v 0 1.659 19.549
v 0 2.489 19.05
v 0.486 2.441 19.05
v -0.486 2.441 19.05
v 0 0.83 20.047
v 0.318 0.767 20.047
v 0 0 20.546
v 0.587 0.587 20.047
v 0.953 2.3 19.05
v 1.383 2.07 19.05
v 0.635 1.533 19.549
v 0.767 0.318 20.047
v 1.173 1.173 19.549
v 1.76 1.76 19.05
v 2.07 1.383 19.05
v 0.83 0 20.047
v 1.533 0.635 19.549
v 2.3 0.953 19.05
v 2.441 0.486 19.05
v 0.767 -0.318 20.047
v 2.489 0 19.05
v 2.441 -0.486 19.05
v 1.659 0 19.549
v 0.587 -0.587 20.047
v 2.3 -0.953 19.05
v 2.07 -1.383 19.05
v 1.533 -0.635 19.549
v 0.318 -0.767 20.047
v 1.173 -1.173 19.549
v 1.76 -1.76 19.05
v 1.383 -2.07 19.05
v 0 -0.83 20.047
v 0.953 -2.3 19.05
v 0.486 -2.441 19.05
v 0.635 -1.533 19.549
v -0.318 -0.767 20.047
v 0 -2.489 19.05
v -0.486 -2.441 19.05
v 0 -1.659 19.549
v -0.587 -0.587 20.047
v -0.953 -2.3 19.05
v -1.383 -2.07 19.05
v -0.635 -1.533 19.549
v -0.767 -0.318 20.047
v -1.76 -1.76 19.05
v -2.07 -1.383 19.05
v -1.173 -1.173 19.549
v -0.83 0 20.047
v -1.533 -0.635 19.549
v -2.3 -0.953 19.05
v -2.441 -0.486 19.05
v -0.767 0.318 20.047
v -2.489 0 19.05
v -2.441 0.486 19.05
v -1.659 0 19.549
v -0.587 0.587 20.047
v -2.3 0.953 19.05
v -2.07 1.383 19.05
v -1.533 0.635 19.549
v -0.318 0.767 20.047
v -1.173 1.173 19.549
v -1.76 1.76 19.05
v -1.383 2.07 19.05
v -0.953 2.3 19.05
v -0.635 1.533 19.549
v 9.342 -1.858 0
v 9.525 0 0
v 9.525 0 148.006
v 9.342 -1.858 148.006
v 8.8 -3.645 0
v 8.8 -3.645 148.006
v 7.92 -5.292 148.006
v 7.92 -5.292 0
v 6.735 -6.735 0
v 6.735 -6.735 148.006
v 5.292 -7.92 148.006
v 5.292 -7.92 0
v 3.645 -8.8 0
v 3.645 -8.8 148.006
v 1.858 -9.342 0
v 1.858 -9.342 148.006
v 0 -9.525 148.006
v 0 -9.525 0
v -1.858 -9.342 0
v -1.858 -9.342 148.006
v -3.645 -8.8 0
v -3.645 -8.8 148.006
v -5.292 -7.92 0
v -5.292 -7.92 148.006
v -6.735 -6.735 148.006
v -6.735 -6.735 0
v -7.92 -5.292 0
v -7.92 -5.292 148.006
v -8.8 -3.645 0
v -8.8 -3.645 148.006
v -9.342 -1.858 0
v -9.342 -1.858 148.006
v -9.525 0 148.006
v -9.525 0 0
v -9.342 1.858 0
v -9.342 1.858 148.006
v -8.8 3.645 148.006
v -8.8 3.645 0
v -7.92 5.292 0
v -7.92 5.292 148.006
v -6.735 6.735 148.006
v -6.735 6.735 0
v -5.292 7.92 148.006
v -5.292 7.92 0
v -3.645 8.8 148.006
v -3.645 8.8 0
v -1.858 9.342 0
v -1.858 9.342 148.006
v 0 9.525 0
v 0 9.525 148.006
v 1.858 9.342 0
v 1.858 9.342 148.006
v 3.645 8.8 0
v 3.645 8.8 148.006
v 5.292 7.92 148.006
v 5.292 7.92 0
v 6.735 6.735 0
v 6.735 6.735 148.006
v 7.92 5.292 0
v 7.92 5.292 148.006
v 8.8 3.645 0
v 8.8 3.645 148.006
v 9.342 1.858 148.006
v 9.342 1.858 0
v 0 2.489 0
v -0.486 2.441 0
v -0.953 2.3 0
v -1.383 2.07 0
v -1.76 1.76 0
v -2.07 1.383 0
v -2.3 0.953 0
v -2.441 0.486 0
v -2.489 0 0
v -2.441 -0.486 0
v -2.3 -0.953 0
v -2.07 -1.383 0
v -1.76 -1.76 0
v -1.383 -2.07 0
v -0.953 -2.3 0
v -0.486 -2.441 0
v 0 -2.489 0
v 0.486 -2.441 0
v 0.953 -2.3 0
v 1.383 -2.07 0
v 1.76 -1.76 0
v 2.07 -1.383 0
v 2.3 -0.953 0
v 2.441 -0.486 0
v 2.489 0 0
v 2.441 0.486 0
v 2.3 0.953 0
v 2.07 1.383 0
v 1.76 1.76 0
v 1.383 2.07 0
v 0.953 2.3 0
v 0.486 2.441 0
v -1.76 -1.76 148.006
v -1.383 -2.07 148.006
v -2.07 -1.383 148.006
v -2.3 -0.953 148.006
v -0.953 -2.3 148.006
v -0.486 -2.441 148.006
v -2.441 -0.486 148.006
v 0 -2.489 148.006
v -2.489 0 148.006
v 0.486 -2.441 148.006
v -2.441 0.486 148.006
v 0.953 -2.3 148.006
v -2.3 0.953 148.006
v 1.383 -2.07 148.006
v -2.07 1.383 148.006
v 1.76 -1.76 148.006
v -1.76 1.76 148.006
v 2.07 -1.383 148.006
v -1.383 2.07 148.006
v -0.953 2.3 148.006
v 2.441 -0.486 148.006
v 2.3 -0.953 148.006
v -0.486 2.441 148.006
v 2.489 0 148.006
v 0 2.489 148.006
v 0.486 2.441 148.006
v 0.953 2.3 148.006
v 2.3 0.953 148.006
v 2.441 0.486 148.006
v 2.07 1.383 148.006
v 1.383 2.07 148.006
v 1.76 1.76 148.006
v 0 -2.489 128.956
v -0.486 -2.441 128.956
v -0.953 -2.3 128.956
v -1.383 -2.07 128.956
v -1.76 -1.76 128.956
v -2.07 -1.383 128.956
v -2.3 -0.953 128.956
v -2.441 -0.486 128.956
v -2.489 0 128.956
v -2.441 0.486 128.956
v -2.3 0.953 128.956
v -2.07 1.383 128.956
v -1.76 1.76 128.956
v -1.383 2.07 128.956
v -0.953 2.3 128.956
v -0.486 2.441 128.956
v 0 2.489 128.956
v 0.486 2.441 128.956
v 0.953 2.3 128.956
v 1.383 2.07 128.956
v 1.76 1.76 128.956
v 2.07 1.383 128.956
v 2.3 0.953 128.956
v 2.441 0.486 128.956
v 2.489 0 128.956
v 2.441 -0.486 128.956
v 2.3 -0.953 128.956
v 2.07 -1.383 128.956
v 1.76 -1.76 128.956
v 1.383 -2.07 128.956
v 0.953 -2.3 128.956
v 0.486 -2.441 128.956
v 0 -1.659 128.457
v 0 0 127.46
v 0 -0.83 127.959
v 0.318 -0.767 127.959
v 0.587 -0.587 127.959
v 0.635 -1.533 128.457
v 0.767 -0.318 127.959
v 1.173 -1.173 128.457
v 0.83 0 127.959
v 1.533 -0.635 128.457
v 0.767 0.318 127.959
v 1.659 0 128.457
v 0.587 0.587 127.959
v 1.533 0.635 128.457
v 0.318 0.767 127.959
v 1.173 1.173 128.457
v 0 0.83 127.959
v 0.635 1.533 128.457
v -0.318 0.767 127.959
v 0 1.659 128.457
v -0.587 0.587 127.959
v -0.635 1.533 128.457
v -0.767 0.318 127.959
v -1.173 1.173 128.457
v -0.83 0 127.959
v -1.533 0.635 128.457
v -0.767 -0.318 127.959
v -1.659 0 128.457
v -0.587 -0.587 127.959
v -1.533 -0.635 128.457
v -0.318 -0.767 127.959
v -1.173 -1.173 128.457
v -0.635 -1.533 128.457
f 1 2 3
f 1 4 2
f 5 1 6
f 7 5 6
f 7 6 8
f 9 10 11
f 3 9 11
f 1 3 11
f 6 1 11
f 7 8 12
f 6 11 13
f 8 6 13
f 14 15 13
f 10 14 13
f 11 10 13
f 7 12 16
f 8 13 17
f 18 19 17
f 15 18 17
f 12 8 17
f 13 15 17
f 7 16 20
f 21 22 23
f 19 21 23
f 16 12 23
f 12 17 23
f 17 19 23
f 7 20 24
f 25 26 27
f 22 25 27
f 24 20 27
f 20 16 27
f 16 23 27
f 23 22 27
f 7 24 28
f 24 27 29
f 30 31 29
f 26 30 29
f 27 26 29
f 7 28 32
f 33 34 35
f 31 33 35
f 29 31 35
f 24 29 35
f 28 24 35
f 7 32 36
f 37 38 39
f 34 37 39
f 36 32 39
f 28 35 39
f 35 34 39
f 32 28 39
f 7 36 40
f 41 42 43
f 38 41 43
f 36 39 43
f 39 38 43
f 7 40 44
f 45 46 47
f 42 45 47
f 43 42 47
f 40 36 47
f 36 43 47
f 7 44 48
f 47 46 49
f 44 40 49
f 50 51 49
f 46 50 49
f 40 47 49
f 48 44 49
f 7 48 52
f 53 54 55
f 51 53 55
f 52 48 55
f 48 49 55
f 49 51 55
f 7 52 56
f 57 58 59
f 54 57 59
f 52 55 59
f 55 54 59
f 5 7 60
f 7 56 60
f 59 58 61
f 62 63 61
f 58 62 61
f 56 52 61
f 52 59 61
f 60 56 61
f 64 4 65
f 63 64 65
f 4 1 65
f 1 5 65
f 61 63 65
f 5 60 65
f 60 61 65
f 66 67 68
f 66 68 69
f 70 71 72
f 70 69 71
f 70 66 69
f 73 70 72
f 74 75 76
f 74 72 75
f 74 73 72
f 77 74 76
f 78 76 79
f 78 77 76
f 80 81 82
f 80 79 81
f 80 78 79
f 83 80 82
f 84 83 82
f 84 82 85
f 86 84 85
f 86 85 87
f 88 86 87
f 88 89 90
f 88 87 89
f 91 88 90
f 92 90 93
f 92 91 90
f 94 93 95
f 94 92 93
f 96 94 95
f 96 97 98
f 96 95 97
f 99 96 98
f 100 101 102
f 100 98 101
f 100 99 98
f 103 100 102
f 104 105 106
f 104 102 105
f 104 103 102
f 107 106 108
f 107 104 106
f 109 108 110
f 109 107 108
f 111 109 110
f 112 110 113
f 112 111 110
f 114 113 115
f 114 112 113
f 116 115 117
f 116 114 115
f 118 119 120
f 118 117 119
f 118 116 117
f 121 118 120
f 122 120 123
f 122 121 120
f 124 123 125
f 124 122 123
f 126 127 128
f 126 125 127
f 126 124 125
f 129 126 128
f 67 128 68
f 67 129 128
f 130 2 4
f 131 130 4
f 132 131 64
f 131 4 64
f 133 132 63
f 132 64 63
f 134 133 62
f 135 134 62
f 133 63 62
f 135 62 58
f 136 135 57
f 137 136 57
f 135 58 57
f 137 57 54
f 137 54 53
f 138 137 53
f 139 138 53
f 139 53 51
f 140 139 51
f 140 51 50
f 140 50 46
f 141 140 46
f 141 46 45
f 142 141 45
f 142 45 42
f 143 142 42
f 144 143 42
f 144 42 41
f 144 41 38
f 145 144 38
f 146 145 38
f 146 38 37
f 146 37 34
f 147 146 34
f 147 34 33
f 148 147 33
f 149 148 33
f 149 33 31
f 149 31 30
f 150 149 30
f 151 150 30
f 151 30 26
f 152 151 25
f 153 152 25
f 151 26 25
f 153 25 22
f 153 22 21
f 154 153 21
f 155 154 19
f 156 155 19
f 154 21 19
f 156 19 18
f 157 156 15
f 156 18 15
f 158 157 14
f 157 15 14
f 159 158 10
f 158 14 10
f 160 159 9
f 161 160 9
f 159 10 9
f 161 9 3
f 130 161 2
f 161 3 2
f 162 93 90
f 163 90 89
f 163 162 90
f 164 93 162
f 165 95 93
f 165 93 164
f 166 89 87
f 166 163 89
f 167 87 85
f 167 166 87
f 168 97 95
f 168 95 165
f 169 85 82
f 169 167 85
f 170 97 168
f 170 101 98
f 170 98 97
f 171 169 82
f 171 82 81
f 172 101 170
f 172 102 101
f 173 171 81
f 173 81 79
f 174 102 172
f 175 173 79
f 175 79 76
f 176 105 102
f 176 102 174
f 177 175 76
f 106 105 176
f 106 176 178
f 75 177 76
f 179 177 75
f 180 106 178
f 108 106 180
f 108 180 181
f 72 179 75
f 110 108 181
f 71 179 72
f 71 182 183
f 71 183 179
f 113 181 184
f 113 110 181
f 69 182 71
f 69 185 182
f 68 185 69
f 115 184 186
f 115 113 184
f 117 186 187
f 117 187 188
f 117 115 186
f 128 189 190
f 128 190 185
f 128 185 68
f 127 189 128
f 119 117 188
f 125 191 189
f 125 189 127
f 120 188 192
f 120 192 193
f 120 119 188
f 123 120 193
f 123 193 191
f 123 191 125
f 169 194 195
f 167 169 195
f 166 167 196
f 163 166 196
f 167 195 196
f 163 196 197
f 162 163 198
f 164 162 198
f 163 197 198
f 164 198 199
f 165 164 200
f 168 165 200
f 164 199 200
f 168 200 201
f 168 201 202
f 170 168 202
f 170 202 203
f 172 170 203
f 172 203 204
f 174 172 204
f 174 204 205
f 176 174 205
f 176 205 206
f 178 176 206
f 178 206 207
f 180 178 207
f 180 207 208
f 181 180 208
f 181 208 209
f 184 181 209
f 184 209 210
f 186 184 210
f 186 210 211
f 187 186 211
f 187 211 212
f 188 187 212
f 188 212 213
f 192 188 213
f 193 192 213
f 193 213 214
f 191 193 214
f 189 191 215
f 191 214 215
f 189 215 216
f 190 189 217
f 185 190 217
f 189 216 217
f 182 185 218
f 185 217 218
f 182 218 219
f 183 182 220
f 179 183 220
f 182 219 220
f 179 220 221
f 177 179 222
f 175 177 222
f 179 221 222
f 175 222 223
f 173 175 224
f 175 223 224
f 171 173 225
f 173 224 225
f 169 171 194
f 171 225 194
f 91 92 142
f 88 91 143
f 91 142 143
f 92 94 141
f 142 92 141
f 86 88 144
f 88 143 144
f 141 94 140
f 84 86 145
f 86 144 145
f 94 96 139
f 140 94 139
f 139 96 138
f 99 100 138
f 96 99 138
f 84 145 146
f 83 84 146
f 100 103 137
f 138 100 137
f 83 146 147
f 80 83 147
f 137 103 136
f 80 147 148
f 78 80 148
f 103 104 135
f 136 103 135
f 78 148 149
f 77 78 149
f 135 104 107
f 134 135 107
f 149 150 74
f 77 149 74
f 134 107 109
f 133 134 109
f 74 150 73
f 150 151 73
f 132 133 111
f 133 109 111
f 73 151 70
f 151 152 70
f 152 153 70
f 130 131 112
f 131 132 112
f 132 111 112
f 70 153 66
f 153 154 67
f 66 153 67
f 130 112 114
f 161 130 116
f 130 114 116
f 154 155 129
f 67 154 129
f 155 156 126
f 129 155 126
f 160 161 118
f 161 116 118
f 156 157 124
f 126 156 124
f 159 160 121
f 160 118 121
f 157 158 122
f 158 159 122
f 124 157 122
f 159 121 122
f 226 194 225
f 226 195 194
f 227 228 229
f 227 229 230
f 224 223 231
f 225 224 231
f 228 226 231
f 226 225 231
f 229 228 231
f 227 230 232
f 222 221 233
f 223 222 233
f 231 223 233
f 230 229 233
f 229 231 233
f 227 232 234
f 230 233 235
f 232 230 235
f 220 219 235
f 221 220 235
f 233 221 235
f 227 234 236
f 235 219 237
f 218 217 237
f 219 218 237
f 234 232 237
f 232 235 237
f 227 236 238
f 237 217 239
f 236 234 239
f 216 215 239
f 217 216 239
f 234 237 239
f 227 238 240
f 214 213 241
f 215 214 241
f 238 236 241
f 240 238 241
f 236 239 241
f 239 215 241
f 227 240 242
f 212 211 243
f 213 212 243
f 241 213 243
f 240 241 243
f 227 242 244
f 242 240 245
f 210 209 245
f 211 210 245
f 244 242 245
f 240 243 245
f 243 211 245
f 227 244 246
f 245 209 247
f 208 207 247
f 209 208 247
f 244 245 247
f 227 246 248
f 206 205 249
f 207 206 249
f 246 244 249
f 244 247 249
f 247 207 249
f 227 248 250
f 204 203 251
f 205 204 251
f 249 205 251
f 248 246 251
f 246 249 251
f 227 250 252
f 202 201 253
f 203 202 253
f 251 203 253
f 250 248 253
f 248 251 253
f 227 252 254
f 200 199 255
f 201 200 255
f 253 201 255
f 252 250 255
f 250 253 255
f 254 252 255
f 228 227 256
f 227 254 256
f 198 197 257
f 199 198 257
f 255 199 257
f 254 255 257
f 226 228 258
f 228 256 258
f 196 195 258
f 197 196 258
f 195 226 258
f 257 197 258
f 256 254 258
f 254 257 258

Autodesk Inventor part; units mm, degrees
ref_plane "YZ Plane" through (0, 0, 0) normal (1, 0, 0) x (0, 1, 0)
ref_plane "XZ Plane" through (0, 0, 0) normal (0, 1, 0) x (-1, 0, 0)
ref_plane "XY Plane" through (0, 0, 0) normal (0, 0, 1) x (1, 0, 0)
sketch "Sketch1" plane through (0, 0, 0) normal (0, 0, 1) x (1, 0, 0)
  circle A0 centre (0, 0) radius 9.525
  dimension "d0" = 19.05
extrude "Extrusion1" add sketch "Sketch1" along normal blind 148.0058
sketch "Sketch2" plane through (0, 0, 148.0058) normal (0, 0, 1) x (1, 0, 0)
  point P0 (0, 0)
  point P1 (0, 0)
sketch "Sketch3" plane through (0, 0, 0) normal (0, 0, -1) x (-1, 0, 0)
  point P0 (0, 0)
  point P1 (0, 0)
hole "Hole1" at (0, 0, 0) direction (0, 0, 1) diameter 4.9784 depth 19.05 tip angle 118 thread size "1/4-20 UNC" class "2B" standard "ANSI Unified Screw Threads"
hole "Hole2" at (0, 0, 148.0058) direction (0, 0, -1) diameter 4.9784 depth 19.05 tip angle 118 thread size "1/4-20 UNC" class "2B" standard "ANSI Unified Screw Threads"
properties part number "Plate Spacer" material "Aluminum 6061"
